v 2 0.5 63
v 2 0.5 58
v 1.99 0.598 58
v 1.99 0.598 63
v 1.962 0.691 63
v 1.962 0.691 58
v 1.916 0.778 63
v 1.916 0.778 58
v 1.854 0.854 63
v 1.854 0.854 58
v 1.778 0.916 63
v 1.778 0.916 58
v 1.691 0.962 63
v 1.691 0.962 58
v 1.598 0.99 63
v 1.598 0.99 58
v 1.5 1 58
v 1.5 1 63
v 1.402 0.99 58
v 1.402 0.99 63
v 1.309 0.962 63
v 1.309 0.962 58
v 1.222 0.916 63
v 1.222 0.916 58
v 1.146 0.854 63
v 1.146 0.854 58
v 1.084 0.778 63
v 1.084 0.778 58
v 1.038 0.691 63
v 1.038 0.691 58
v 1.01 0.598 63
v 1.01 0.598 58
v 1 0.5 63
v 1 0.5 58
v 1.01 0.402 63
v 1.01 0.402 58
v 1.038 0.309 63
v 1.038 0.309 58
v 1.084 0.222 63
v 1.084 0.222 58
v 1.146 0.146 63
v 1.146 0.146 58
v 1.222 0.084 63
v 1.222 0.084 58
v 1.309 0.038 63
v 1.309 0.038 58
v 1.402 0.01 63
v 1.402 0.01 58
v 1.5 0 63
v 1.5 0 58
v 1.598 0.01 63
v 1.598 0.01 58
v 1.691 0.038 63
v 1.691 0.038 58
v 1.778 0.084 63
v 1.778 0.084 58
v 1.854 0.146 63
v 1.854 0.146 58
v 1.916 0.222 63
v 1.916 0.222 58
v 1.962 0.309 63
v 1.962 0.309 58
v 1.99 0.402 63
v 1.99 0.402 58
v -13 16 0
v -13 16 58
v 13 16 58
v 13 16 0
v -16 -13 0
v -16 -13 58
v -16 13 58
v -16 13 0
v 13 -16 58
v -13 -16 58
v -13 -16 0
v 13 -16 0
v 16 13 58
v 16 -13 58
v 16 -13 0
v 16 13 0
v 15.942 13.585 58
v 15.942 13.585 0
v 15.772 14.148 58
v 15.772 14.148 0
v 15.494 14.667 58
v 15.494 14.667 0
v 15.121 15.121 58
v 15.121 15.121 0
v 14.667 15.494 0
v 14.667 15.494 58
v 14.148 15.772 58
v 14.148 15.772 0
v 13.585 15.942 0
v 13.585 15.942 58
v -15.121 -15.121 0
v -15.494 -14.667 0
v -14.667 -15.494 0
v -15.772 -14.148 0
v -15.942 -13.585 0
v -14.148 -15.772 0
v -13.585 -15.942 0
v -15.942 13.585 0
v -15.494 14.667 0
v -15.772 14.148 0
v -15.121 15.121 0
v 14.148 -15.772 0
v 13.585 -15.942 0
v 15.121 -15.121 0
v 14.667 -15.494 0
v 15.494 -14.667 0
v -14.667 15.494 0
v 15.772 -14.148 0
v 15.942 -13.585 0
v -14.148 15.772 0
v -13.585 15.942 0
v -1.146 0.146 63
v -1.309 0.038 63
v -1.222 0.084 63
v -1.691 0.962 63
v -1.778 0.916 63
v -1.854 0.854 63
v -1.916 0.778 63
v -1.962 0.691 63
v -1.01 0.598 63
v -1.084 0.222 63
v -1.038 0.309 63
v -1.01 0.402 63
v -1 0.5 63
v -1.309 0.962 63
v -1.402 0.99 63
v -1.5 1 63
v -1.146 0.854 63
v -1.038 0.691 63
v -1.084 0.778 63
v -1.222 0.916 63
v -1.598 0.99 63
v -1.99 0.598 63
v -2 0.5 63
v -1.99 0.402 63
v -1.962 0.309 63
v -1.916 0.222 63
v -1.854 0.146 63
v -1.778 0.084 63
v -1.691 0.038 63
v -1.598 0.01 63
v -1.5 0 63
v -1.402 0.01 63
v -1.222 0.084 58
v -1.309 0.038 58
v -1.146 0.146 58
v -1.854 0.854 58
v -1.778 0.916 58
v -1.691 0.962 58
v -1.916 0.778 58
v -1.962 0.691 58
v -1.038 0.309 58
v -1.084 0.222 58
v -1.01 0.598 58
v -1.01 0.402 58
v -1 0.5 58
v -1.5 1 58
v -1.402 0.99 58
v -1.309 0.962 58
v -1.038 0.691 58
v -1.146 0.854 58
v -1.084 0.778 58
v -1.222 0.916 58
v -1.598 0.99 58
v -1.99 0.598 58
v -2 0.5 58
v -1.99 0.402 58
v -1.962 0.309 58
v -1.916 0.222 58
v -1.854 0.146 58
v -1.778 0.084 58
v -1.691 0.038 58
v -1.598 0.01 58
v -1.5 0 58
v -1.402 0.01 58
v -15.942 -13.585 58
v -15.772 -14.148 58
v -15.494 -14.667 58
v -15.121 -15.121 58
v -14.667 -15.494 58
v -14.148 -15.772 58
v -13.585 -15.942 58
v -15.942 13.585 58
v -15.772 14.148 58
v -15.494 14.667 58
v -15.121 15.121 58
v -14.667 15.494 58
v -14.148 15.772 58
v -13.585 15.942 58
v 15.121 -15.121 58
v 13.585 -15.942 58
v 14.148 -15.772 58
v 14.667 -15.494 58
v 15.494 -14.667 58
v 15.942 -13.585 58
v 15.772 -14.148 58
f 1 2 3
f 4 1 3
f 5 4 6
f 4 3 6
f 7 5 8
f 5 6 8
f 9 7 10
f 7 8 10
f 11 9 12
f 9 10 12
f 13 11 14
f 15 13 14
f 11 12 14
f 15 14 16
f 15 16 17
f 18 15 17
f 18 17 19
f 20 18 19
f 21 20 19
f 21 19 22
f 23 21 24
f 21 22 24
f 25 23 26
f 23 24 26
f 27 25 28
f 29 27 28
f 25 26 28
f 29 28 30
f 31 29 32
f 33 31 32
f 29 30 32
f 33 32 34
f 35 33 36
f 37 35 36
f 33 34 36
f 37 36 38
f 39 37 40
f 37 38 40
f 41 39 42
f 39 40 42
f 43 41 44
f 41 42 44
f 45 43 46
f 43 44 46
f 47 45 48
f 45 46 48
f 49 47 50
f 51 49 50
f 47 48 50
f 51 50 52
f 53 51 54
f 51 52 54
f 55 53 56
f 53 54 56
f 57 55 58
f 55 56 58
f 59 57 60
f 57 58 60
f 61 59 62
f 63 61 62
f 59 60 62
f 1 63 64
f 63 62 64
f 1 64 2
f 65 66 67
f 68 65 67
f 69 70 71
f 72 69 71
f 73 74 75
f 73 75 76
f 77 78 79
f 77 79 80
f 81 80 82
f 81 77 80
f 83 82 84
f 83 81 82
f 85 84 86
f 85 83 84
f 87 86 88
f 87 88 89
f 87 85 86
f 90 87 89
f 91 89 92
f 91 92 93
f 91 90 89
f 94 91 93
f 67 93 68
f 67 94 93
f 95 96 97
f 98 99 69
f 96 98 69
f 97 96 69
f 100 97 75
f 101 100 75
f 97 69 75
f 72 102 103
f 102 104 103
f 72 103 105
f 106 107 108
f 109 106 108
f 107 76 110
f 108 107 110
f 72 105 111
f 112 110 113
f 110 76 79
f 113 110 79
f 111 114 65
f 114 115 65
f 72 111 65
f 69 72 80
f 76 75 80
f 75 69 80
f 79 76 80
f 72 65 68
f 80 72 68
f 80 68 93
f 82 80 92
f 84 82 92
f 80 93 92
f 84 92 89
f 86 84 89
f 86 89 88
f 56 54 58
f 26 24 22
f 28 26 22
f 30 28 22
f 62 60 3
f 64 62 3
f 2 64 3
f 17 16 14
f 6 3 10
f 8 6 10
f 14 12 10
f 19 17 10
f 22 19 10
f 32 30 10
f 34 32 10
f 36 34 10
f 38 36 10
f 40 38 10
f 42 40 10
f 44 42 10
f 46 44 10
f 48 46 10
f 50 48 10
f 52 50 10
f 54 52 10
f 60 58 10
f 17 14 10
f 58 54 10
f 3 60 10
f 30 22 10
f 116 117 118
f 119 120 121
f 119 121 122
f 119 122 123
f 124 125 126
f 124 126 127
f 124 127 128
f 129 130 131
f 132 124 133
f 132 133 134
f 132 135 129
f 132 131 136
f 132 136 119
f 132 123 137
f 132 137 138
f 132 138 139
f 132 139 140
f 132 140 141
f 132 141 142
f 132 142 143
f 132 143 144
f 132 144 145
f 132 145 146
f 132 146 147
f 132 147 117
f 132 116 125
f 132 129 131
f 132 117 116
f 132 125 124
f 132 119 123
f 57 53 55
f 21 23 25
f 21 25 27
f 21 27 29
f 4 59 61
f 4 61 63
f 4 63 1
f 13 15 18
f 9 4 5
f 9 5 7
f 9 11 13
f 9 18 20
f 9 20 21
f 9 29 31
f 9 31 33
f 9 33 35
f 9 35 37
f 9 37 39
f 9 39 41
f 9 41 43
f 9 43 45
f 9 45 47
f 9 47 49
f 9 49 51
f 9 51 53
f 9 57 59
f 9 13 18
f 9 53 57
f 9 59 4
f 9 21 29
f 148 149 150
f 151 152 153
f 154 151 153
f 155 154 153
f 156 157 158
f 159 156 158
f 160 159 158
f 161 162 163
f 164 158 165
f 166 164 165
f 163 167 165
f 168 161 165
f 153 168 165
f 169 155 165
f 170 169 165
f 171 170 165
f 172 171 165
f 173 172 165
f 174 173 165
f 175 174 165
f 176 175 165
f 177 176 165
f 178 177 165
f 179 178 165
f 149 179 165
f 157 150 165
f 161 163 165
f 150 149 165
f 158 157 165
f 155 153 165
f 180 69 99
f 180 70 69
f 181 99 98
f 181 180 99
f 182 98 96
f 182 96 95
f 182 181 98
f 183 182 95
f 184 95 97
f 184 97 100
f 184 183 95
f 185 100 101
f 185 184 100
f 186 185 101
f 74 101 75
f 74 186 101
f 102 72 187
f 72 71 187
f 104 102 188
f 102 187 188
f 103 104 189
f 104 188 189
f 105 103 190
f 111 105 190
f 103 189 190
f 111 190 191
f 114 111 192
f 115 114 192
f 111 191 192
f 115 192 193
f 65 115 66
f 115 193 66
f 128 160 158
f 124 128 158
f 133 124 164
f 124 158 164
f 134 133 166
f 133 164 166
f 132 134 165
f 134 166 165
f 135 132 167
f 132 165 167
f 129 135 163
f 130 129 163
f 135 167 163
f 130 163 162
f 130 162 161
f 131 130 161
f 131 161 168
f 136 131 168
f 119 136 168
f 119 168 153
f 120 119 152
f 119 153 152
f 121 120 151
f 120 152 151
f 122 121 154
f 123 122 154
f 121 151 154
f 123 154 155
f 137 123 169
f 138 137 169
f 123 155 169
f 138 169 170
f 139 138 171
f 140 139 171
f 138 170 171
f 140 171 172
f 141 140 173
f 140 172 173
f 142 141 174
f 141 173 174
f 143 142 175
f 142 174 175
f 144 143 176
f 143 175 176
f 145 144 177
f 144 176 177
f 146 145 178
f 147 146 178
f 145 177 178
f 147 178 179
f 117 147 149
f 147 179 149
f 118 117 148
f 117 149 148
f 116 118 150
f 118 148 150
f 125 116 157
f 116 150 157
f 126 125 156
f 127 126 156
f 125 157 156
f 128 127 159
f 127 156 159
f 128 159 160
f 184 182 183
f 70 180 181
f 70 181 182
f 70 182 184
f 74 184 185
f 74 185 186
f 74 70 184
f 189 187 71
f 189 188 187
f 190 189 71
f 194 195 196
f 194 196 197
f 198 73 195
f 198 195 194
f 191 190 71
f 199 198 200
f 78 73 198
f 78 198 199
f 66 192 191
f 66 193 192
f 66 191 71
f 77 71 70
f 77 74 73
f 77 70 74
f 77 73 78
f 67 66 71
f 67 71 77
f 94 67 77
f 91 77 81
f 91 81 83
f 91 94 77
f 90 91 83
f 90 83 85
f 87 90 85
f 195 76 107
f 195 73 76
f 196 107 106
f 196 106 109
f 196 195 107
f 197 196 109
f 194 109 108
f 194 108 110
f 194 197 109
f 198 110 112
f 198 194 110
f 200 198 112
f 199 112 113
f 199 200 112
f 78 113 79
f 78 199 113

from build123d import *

# Parameters (mm, degrees)
SKETCH_1_W        = 32
SKETCH_1_H        = 32
EXTRUDE_1_DEPTH   = 58
FILLET_1_R        = 3
SKETCH_2_R        = 0.5
EXTRUDE_2_DEPTH   = 5
EXTRUDE_2_2_DEPTH = 5


with BuildPart() as part:
    # ｽｹｯﾁ1 → ﾎﾞｽ - 押し出し1 (new body)
    with BuildSketch(Plane.XY):
        Rectangle(SKETCH_1_W, SKETCH_1_H)
    extrude(amount=EXTRUDE_1_DEPTH)

    # ﾌｨﾚｯﾄ1
    fillet_1_edges = [part.edges().sort_by_distance(p)[0] for p in [
        (-16, 16, 29),
        (16, 16, 29),
        (16, -16, 29),
        (-16, -16, 29),
    ]]
    fillet(fillet_1_edges, radius=FILLET_1_R)


with BuildPart() as body_2:
    # ｽｹｯﾁ2 → ﾎﾞｽ - 押し出し2 (new body)
    with BuildSketch(Plane.XY.offset(58)):
        with Locations((-1.5, 0.5)):
            Circle(SKETCH_2_R)
    extrude(amount=EXTRUDE_2_DEPTH)


with BuildPart() as body_3:
    # ｽｹｯﾁ2 → Extrude 2 2 (new body)
    with BuildSketch(Plane.XY.offset(58)):
        with Locations((1.5, 0.5)):
            Circle(SKETCH_2_R)
    extrude(amount=EXTRUDE_2_2_DEPTH)


solid = Compound([part.part, body_2.part, body_3.part])
